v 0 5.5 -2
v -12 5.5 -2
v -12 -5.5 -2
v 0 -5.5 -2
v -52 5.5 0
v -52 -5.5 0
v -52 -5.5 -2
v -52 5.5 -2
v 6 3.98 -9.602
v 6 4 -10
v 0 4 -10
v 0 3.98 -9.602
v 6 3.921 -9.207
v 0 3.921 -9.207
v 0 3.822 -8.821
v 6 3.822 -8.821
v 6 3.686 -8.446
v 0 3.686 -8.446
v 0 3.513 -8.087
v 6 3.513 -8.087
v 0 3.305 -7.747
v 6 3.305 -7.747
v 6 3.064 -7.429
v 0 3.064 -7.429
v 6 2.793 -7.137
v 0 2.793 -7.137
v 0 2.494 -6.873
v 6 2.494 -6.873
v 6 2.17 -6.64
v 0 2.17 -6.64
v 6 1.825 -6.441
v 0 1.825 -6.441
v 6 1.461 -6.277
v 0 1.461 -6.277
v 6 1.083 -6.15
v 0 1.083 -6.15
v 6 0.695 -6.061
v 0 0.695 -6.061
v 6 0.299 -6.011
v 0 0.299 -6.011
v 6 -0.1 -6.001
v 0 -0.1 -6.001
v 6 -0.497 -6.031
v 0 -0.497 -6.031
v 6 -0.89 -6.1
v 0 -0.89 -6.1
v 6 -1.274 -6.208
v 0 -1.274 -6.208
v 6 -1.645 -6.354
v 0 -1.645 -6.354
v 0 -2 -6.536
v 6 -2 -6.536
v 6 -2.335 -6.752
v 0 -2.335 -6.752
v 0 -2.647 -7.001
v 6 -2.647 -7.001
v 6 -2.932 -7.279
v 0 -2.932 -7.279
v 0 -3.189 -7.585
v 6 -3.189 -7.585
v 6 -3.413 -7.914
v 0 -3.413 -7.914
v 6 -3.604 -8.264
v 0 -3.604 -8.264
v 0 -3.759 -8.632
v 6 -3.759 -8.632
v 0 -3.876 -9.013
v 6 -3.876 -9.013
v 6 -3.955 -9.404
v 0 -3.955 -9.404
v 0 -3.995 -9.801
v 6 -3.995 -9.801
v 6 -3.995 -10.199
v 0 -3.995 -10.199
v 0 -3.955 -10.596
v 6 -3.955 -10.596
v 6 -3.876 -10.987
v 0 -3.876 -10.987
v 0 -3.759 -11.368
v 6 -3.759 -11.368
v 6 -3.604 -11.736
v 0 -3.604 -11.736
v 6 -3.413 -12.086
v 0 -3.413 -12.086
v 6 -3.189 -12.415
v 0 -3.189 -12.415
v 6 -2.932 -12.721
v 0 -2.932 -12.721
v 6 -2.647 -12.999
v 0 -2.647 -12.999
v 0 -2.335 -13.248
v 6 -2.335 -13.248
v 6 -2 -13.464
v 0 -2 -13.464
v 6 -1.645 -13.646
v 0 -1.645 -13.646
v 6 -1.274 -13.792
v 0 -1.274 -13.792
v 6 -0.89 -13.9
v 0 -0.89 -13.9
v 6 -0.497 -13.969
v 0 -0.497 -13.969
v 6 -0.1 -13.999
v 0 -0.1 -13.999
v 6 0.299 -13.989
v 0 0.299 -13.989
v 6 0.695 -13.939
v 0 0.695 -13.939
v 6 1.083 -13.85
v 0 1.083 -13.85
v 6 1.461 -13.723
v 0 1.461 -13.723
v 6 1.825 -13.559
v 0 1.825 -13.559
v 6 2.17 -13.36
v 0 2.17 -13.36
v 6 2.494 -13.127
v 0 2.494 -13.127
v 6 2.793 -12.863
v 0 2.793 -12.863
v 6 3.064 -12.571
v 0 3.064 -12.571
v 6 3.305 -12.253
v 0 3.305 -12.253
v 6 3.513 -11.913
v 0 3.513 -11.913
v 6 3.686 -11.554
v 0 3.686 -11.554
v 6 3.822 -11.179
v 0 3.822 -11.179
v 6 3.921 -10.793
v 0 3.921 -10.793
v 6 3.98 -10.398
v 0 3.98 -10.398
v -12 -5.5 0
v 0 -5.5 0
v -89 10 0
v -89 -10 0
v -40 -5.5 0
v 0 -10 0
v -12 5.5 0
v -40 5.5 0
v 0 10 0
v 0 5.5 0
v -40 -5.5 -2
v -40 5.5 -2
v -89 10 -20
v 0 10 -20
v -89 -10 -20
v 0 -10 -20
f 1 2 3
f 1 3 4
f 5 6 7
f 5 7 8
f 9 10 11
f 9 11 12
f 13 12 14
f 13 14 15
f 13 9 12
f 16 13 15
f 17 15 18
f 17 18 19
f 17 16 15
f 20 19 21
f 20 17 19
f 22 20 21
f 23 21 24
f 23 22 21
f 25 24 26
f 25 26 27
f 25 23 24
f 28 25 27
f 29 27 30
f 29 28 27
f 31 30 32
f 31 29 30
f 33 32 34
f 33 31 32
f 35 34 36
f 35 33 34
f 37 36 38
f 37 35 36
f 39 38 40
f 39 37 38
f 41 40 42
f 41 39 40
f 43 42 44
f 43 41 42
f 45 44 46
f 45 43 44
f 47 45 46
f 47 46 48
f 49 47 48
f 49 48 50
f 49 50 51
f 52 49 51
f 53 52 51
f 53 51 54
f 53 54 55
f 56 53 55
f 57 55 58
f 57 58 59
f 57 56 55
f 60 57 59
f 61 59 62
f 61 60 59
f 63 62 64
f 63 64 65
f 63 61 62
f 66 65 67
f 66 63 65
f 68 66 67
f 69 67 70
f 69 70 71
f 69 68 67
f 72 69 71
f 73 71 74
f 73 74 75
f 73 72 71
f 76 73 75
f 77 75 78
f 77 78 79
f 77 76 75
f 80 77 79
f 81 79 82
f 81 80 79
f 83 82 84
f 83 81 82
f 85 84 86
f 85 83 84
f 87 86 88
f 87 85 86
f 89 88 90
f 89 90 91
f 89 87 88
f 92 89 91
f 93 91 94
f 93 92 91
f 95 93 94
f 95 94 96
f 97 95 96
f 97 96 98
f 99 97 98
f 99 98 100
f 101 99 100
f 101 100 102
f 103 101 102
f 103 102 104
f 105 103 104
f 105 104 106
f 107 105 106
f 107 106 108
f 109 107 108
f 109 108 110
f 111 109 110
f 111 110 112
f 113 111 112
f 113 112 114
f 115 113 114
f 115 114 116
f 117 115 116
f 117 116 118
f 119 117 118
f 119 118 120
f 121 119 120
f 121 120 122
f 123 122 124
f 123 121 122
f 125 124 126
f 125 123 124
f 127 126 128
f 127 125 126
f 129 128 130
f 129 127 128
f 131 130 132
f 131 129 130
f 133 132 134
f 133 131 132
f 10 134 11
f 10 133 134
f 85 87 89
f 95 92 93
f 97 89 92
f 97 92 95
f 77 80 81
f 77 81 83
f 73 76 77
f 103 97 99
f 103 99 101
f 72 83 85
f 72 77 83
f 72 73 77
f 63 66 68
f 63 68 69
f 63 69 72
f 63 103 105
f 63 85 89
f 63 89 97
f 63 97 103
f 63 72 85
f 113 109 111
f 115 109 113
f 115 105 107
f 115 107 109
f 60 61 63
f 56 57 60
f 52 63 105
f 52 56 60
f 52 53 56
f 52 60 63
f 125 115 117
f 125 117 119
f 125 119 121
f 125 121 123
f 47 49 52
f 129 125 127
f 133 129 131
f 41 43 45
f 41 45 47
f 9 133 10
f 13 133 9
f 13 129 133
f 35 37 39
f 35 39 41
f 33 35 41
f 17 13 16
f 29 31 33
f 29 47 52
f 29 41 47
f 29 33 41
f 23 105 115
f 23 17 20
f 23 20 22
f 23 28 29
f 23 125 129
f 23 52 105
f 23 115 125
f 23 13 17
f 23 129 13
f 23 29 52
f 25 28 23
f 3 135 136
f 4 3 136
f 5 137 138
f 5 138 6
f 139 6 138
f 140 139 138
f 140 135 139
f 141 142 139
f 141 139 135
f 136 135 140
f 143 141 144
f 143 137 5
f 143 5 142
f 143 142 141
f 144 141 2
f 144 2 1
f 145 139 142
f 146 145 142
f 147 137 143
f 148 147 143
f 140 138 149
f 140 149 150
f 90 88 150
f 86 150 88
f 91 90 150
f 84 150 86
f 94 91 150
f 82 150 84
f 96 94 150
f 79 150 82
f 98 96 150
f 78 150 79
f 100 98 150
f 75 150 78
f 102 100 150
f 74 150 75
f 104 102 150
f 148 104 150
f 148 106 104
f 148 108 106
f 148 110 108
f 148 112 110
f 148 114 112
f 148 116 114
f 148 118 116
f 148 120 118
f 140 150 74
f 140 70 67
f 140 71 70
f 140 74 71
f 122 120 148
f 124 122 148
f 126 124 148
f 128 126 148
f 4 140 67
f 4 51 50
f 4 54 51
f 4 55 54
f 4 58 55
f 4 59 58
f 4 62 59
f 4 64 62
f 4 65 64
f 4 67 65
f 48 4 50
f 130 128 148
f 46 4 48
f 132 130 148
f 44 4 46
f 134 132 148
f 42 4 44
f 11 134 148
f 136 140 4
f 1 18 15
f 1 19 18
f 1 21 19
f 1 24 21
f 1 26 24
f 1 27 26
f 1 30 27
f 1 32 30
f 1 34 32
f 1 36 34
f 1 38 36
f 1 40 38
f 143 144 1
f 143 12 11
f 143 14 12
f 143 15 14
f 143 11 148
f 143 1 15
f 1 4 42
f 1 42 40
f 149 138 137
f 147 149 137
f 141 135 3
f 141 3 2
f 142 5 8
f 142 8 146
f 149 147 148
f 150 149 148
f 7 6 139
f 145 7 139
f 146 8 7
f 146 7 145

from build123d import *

# Parameters (mm, degrees)
SKETCH_W                 = 95
SKETCH_H                 = 20
PAD_DEPTH                = 20
SKETCH001_W              = 20
SKETCH001_H              = 20
SKETCH001_R              = 4
POCKET_DEPTH             = 6
SKETCH003_W              = 12
SKETCH003_H              = 11
POCKET001_DEPTH          = 2
CLONE_PLACEMENT_ANGLE    = 270
CLONE001_PLACEMENT_ANGLE = 90


with BuildPart() as part:
    # Sketch → Pad (new body)
    with BuildSketch(Plane.XY):
        Rectangle(SKETCH_W, SKETCH_H)
    extrude(amount=-PAD_DEPTH)

    # Sketch001 (on Face2 of Pad) → Pocket (cut)
    with BuildSketch(Plane.YZ.offset(47.5)):
        with Locations((0, -10)):
            Rectangle(SKETCH001_W, SKETCH001_H)
        with Locations((0, -10)):
            Circle(SKETCH001_R, mode=Mode.SUBTRACT)
    extrude(amount=-POCKET_DEPTH, mode=Mode.SUBTRACT)

    # Sketch003 (on Face2 of Pocket) → Pocket001 (cut)
    with BuildSketch(Plane.XY):
        with Locations((35.5, 0)):
            Rectangle(SKETCH003_W, SKETCH003_H)
        with Locations((-4.5, 0)):
            Rectangle(SKETCH003_W, SKETCH003_H)
    extrude(amount=-POCKET001_DEPTH, mode=Mode.SUBTRACT)


with BuildPart() as part_1:
    # Clone placement: moved
    add(part.part.moved(Location((-10, 0, -47.5))).rotate(Axis((-10, 0, -47.5), (0, 1, 0)), CLONE_PLACEMENT_ANGLE))


with BuildPart() as part_2:
    # Clone001 placement: moved
    add(part_1.part.moved(Location((6, 0, -10))).rotate(Axis((6, 0, -10), (0, 1, 0)), CLONE001_PLACEMENT_ANGLE))


solid = part_2.part
